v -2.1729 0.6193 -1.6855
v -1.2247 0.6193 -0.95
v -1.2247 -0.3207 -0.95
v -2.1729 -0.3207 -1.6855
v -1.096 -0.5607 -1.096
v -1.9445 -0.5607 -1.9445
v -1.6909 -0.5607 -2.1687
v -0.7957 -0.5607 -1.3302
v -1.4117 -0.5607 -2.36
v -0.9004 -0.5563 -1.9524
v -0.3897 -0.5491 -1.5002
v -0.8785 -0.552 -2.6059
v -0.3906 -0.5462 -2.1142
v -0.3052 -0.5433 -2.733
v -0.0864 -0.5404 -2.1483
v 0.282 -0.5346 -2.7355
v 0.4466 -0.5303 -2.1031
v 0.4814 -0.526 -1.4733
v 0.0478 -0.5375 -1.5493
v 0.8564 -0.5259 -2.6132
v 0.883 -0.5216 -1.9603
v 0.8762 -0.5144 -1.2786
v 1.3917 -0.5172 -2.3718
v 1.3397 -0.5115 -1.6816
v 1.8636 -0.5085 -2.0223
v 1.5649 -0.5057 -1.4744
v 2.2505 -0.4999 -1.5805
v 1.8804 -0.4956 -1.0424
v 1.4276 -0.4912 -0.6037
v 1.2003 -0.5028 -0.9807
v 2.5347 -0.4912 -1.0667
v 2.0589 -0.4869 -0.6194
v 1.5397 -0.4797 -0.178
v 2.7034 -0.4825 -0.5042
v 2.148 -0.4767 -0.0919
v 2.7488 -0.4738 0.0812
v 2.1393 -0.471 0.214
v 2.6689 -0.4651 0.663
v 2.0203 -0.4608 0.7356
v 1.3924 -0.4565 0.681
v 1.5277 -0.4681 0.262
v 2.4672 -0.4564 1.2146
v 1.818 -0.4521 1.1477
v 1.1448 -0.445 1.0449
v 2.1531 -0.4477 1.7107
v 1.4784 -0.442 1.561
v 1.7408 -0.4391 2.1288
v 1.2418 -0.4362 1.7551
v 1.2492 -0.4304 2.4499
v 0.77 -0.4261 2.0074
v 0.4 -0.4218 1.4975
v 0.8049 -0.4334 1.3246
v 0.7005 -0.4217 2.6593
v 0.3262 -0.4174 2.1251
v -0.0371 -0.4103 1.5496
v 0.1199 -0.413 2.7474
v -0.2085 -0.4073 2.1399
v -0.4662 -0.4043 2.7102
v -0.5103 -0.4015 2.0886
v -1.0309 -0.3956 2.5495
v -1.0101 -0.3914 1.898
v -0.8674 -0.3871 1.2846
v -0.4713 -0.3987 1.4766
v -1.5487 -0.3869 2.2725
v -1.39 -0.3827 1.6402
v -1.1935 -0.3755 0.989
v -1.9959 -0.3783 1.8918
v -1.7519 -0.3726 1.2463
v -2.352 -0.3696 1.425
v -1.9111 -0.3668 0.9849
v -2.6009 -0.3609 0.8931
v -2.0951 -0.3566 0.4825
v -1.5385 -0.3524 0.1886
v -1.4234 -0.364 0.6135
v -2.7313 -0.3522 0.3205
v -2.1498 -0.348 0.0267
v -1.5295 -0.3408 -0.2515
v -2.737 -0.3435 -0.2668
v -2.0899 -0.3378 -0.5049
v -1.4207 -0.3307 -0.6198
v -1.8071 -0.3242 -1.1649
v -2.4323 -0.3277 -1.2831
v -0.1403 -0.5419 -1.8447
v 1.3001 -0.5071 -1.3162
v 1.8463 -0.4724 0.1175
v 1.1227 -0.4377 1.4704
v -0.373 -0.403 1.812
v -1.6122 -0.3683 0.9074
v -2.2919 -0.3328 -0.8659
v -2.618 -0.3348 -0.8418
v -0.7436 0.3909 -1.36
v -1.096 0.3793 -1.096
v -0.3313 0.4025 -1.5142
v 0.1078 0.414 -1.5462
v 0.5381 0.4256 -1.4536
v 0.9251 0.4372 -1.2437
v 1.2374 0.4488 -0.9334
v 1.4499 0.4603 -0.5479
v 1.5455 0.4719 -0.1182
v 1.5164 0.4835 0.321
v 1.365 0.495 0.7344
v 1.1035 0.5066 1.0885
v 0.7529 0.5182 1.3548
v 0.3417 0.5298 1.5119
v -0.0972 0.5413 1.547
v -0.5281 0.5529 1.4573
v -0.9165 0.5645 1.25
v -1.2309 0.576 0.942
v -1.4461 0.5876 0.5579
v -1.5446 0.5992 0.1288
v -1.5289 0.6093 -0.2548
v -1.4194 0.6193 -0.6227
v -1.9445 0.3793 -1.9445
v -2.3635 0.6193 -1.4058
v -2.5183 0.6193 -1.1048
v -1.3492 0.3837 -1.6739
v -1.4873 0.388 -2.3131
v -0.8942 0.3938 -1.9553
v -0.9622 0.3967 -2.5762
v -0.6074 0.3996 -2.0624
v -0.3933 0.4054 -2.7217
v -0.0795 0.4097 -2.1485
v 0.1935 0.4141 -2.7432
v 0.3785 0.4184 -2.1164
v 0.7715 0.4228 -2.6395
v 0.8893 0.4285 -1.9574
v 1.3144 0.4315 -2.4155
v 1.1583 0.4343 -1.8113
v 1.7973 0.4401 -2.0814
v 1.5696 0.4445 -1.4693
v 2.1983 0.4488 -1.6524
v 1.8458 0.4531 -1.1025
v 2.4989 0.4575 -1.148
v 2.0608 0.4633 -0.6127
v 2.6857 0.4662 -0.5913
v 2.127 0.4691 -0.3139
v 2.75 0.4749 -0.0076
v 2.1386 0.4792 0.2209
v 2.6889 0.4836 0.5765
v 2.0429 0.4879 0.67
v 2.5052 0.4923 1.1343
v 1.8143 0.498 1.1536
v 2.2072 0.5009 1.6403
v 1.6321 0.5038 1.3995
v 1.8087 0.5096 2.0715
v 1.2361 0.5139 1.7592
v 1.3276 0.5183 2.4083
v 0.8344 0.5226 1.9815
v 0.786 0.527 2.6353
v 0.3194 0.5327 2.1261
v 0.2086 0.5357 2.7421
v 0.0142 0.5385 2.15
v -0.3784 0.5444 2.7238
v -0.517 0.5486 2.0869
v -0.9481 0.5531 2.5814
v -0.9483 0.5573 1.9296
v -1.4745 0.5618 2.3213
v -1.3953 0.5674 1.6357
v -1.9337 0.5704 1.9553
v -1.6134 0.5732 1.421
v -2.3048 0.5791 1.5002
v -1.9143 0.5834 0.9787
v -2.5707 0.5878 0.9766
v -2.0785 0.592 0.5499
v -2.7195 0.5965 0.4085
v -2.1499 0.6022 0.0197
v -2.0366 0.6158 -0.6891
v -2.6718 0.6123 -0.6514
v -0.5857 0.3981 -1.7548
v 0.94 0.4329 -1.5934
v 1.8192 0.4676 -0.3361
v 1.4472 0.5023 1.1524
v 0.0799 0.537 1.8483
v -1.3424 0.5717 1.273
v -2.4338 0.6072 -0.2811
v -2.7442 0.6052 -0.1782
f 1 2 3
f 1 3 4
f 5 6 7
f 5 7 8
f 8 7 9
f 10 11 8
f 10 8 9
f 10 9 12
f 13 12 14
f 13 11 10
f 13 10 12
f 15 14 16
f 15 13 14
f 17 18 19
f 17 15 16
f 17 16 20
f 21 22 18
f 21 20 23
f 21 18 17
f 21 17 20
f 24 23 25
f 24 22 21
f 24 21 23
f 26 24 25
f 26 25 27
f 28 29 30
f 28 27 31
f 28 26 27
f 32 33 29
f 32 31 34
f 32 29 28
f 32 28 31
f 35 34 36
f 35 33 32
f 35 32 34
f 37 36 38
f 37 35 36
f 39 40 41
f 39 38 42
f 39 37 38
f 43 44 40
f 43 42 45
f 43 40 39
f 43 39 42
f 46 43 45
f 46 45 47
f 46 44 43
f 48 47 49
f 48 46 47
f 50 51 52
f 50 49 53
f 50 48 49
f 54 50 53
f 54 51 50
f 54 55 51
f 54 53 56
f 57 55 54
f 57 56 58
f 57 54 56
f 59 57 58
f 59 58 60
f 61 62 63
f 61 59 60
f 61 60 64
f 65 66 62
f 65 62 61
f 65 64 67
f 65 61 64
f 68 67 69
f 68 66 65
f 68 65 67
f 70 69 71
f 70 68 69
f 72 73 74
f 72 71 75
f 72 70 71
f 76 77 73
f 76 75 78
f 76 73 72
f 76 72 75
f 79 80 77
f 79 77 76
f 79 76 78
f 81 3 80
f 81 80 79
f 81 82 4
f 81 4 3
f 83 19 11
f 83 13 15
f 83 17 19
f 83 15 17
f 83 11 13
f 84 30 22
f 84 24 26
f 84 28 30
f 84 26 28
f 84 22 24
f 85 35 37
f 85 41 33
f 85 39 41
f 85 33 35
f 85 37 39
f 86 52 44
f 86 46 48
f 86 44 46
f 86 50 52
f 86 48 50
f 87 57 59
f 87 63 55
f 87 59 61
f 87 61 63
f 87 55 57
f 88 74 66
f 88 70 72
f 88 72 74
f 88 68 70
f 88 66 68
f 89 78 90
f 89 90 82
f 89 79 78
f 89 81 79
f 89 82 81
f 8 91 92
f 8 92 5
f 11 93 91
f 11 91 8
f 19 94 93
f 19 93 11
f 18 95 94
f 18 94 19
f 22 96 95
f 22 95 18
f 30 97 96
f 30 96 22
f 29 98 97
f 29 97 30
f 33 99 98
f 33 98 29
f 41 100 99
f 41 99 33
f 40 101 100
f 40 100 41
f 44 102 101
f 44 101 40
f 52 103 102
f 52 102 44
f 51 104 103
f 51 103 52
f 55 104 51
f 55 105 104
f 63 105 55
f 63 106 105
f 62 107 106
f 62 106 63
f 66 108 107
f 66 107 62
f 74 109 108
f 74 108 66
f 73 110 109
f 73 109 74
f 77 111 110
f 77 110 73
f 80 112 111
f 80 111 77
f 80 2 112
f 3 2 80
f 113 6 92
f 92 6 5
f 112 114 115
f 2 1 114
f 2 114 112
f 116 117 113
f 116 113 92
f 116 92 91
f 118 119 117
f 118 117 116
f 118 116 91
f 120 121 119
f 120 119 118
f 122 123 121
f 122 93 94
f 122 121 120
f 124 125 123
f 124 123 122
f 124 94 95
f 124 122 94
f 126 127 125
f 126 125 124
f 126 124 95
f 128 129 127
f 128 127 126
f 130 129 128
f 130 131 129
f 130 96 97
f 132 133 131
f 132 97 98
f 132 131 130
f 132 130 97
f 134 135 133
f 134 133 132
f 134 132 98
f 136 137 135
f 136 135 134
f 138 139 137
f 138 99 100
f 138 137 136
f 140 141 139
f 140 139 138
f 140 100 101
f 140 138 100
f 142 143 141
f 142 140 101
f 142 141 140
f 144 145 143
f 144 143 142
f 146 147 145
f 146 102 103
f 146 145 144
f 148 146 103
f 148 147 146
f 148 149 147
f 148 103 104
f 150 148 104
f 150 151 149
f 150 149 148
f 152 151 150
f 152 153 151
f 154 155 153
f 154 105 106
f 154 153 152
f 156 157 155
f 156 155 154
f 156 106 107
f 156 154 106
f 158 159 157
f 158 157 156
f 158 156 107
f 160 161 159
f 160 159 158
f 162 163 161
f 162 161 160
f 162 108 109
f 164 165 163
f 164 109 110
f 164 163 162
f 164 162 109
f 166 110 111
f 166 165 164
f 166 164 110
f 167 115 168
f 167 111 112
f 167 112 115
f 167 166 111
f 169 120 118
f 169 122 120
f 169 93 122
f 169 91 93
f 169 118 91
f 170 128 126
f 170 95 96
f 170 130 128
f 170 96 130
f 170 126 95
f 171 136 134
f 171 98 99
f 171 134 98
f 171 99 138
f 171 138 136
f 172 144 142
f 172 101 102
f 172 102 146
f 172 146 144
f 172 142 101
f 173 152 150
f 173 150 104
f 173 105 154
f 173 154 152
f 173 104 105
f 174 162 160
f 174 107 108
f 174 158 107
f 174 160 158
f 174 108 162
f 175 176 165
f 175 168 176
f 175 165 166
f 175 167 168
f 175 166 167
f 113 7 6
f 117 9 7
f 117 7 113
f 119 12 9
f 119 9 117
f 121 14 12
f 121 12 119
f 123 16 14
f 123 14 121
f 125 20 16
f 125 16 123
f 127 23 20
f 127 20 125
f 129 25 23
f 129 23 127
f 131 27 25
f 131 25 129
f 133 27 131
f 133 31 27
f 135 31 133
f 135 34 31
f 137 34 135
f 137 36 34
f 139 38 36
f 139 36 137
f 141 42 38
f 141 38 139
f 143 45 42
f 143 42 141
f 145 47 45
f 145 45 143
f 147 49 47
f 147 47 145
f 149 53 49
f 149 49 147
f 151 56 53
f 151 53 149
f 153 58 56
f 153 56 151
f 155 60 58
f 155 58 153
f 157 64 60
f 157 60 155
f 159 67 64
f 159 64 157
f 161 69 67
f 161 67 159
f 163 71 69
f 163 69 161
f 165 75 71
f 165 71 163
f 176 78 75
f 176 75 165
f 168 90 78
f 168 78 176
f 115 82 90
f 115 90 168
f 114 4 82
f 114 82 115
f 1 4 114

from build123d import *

# Parameters (mm, degrees)
SWEEP1_PITCH            = 0.255102041
SWEEP1_HEIGHT           = 0.25
SWEEP1_RADIUS           = 2.15
SWEEP1_START_ANGLE      = -135
SKETCH1_W               = 1.2
SKETCH1_H               = 0.95
CUT_EXTRUDE1_DEPTH      = 10
CUT_EXTRUDE1_DEPTH_BACK = 10
SKETCH3_OUTSIDE_W       = 9.074
SKETCH3_OUTSIDE_H       = 4.774
SKETCH3_OUTSIDE_W_2     = 6.103736904
SKETCH3_OUTSIDE_H_2     = 1.18


with BuildPart() as part:
    # Sweep1: sweep along a helix
    with BuildLine() as sweep1_path:
        add(Helix(SWEEP1_PITCH, SWEEP1_HEIGHT, SWEEP1_RADIUS, center=(0, 0, 0), direction=(0, 1, 0), lefthand=True, mode=Mode.PRIVATE).rotate(Axis((0, 0, 0), (0, 1, 0)), SWEEP1_START_ANGLE))
    # Sketch1 → Sweep1 (sweep)
    with BuildSketch(Plane.XY):
        with Locations((2.15, 0)):
            Rectangle(SKETCH1_W, SKETCH1_H)
    sweep(path=sweep1_path.line, is_frenet=True)

    # Sketch3 outside → Cut-Extrude1 (cut, two sides: drawn at the far end of the back side and taken through both)
    with BuildSketch(Plane.XY.offset(-CUT_EXTRUDE1_DEPTH_BACK)):
        with Locations((0, 0.029)):
            Rectangle(SKETCH3_OUTSIDE_W, SKETCH3_OUTSIDE_H)
        with Locations((0, 0.029337102)):
            Rectangle(SKETCH3_OUTSIDE_W_2, SKETCH3_OUTSIDE_H_2, mode=Mode.SUBTRACT)
    extrude(amount=CUT_EXTRUDE1_DEPTH + CUT_EXTRUDE1_DEPTH_BACK, mode=Mode.SUBTRACT)


solid = part.part
